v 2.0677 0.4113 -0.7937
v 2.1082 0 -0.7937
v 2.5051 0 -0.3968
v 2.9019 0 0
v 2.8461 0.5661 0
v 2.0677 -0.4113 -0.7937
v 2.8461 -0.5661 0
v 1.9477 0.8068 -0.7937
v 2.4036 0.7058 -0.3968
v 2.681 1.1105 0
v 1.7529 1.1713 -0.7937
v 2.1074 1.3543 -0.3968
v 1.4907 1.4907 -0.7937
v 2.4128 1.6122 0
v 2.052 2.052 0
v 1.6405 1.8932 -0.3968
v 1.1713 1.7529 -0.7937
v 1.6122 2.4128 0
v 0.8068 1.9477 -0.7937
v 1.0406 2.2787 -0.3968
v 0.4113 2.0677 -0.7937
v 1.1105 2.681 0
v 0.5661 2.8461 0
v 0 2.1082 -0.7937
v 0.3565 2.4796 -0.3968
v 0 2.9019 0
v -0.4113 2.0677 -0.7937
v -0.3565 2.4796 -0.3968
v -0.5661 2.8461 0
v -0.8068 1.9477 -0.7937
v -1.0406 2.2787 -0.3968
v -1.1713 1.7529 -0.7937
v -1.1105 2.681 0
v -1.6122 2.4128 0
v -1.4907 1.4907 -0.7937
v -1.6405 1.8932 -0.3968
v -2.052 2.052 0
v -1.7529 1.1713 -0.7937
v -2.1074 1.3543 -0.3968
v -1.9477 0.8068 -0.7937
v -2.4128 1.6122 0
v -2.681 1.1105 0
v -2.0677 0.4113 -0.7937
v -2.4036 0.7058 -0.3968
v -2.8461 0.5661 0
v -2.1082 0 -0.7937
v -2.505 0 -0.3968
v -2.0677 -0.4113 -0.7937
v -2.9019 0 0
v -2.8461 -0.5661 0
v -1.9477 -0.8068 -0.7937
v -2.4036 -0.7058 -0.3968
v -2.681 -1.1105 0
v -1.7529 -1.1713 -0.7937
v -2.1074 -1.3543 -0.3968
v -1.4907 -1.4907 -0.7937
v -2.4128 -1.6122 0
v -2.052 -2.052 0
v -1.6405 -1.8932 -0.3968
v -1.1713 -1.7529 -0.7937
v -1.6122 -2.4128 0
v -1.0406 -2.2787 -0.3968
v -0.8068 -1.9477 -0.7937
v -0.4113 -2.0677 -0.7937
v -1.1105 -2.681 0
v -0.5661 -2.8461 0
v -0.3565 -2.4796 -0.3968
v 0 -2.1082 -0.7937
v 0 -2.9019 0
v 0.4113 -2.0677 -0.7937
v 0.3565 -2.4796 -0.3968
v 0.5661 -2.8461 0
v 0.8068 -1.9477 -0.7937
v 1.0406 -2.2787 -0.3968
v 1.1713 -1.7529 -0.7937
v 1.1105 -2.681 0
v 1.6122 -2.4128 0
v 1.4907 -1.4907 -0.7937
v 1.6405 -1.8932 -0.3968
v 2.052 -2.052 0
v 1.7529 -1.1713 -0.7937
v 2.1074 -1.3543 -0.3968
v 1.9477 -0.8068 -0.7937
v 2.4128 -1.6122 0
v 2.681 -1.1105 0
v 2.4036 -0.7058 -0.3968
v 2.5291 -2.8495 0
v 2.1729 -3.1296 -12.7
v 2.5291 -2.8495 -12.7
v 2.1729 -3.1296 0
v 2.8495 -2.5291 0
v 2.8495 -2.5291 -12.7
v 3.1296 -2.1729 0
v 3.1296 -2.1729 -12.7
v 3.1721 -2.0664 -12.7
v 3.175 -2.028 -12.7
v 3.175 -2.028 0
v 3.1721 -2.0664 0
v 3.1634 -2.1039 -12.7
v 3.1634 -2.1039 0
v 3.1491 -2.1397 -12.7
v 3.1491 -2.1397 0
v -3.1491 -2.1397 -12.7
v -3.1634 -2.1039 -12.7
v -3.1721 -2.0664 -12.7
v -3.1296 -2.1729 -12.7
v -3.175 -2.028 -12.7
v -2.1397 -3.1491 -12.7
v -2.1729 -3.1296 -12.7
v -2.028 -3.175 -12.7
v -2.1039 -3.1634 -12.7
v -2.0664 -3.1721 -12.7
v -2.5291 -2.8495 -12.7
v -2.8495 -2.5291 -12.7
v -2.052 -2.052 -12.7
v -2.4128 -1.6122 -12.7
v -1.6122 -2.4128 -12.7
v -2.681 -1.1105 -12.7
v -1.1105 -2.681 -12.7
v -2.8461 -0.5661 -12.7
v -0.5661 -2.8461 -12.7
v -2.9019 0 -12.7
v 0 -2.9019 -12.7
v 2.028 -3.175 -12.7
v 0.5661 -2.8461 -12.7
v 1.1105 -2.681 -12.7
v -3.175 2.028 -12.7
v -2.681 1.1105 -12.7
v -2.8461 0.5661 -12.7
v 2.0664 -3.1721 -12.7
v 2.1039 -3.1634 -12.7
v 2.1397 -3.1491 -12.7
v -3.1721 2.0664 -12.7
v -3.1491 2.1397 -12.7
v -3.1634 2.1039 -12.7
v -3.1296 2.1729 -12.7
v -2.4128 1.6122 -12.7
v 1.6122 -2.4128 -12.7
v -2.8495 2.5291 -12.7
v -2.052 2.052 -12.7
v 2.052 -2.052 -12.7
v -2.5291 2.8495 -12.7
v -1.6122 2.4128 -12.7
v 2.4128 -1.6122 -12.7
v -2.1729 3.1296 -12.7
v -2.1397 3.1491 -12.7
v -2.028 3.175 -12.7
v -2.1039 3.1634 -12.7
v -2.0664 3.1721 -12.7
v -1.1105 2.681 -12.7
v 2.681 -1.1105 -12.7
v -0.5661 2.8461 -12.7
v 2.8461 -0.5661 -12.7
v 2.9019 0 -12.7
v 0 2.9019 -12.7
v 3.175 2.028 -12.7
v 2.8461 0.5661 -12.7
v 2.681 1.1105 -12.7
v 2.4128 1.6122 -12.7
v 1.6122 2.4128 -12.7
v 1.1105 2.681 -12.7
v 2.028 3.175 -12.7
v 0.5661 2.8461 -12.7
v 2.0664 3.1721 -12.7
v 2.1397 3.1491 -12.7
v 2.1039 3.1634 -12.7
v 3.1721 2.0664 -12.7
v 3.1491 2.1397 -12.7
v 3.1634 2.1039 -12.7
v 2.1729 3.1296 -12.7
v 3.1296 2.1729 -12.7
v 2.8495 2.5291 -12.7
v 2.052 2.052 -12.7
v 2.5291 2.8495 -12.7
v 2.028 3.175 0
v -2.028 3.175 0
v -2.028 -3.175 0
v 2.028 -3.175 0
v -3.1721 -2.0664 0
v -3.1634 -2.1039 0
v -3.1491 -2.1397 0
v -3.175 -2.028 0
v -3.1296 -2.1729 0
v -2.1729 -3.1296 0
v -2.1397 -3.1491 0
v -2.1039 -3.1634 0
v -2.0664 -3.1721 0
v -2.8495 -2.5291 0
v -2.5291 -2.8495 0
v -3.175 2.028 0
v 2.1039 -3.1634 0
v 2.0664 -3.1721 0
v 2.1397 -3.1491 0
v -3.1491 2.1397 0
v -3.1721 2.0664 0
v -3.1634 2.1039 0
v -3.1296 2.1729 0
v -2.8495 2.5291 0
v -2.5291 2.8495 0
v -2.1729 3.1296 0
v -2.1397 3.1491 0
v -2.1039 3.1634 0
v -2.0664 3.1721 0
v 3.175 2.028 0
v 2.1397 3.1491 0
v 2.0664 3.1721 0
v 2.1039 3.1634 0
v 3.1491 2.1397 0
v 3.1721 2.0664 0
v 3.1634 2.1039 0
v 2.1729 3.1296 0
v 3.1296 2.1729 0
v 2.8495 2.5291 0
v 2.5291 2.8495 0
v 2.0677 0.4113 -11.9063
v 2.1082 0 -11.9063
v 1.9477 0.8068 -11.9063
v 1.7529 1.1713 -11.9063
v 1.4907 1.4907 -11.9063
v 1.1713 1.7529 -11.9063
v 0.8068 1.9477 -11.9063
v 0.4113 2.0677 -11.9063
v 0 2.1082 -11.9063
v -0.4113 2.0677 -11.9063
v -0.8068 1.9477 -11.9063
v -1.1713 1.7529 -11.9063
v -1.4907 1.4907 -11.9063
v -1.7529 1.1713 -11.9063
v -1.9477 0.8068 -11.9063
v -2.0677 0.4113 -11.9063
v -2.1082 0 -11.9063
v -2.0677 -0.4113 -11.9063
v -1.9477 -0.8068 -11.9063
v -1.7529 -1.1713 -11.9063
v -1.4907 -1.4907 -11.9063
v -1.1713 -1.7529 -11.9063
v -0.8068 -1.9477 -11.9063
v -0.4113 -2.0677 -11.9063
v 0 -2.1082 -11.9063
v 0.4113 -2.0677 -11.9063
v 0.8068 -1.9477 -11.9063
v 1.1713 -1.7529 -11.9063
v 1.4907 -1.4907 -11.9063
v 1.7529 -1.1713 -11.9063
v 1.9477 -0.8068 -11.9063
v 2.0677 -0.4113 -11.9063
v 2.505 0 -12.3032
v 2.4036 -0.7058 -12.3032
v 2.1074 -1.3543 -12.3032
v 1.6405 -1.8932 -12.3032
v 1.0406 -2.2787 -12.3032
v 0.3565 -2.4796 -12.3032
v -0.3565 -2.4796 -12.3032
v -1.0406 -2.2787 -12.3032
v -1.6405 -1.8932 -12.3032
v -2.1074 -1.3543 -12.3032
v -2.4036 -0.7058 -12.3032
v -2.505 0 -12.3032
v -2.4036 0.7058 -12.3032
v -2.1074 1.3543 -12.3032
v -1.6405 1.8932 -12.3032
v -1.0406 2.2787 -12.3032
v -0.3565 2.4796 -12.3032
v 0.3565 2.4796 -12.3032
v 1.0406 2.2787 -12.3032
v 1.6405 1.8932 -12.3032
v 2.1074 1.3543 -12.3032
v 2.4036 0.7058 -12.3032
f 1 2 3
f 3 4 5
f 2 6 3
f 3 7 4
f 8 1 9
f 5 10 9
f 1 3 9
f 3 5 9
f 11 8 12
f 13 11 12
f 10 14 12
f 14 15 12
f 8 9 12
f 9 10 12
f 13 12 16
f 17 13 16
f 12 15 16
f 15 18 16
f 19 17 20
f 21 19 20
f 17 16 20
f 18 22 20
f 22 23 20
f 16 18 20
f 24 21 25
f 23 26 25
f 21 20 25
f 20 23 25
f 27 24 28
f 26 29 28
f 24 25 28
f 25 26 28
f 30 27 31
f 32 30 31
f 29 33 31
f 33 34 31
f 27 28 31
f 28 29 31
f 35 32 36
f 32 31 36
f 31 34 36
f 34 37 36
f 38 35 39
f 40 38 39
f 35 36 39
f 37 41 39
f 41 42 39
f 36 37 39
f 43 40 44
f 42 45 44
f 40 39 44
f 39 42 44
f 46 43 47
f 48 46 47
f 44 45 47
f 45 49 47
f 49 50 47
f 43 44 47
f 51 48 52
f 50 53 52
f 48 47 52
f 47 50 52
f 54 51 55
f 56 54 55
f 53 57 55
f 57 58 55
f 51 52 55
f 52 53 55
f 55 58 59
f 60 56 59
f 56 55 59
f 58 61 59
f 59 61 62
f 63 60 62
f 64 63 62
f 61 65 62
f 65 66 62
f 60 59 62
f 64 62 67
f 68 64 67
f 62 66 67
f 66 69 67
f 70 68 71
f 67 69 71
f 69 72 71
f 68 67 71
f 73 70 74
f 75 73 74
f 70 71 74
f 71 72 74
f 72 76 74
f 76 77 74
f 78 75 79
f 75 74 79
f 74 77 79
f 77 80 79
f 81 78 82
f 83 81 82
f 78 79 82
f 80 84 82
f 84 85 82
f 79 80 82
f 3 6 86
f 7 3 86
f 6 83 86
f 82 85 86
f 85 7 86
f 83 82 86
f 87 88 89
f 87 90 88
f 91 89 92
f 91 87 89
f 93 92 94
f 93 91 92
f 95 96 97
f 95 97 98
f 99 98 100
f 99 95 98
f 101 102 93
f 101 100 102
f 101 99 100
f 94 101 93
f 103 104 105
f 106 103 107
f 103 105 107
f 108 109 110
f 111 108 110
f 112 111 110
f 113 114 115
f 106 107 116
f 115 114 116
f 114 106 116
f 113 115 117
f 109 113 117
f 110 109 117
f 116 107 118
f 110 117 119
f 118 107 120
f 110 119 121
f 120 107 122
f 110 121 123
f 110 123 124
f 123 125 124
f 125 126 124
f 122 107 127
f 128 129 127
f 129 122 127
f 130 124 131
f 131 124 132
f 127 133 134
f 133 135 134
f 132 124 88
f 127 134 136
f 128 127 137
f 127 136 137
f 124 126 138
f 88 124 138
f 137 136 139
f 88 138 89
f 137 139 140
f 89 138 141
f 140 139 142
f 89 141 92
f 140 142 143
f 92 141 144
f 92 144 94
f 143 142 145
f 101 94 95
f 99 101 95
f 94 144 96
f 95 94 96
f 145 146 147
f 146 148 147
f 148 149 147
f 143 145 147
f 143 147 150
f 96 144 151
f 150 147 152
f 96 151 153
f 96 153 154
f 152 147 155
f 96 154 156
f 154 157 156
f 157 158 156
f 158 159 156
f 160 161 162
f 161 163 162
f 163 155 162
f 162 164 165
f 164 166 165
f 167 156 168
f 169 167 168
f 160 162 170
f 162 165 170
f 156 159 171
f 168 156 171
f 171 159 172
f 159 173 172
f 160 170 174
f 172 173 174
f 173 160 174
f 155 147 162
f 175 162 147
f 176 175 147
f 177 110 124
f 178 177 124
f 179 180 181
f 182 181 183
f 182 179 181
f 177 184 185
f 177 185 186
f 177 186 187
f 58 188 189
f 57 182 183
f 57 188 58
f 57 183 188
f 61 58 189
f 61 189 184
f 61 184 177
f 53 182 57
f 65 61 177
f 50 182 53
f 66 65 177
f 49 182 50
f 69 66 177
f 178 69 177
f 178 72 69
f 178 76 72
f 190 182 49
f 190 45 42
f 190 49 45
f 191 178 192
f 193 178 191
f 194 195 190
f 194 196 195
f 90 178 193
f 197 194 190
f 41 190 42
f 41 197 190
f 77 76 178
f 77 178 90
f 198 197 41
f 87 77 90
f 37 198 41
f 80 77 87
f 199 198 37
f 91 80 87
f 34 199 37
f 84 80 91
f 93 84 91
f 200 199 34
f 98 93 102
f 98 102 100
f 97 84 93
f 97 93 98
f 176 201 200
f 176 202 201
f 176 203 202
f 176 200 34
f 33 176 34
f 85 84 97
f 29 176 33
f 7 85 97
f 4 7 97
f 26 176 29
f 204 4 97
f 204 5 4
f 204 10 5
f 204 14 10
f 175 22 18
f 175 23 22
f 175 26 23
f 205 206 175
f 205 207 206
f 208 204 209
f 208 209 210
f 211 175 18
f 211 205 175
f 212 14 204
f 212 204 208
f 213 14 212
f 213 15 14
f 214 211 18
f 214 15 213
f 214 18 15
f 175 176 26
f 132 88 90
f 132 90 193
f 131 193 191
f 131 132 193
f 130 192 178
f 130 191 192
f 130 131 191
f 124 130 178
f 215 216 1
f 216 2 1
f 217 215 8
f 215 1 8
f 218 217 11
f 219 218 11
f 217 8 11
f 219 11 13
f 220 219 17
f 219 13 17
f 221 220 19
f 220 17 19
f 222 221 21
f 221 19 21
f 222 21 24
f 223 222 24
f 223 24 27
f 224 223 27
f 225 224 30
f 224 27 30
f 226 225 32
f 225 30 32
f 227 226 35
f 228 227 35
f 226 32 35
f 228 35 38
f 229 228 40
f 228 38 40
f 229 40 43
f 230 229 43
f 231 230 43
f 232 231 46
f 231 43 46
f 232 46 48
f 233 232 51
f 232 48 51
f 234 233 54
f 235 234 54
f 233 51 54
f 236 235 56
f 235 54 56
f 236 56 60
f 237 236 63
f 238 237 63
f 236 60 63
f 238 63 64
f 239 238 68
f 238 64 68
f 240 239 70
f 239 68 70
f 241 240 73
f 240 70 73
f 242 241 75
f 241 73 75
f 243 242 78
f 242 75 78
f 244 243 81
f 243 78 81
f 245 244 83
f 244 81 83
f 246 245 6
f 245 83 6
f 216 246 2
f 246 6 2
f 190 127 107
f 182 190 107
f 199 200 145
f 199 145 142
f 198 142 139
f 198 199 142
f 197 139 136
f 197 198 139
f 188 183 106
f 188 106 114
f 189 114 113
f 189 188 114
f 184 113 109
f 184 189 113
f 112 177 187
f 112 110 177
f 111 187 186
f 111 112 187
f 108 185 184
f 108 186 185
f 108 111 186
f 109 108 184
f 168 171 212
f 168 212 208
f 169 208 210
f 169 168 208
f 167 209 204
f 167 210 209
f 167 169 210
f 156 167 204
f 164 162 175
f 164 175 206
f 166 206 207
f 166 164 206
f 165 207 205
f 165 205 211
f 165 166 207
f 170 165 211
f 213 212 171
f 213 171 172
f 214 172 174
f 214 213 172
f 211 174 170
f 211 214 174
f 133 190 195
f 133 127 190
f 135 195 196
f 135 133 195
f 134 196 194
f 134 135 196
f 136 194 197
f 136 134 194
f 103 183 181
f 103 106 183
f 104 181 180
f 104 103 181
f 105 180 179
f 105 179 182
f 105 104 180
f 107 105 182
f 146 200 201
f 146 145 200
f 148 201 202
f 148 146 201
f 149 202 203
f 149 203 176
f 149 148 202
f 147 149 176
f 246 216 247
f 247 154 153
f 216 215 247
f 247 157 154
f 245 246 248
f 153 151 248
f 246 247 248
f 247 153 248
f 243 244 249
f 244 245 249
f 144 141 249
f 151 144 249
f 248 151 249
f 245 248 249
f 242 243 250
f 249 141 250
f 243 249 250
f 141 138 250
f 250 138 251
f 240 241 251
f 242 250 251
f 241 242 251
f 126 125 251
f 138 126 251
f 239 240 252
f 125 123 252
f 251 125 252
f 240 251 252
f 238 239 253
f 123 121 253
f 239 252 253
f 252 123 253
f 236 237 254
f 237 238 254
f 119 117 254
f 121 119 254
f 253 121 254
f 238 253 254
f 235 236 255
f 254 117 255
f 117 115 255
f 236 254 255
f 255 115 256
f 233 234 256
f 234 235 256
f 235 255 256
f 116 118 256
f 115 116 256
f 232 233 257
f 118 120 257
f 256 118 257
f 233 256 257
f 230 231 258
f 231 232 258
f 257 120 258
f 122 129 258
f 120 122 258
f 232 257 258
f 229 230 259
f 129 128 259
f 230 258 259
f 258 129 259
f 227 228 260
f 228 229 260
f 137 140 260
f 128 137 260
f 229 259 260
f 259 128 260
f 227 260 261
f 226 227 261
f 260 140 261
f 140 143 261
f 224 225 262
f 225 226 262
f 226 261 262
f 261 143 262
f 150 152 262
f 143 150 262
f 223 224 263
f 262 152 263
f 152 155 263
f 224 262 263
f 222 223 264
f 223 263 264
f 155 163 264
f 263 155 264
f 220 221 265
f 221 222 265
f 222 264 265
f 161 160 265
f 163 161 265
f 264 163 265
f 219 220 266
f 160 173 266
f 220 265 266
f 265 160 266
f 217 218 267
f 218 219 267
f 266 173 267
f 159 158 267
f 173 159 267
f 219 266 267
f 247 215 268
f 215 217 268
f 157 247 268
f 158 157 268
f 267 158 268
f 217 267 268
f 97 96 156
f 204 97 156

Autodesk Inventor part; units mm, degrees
ref_plane "YZ Plane" through (0, 0, 0) normal (1, 0, 0) x (0, 1, 0)
ref_plane "XZ Plane" through (0, 0, 0) normal (0, 1, 0) x (-1, 0, 0)
ref_plane "XY Plane" through (0, 0, 0) normal (0, 0, 1) x (1, 0, 0)
sketch "Sketch1" plane through (0, 0, 0) normal (0, 0, 1) x (1, 0, 0)
  line L0 (-3.175, -3.175) -> (3.175, -3.175)
  line L1 (3.175, -3.175) -> (3.175, 3.175)
  line L2 (3.175, 3.175) -> (-3.175, 3.175)
  line L3 (-3.175, 3.175) -> (-3.175, -3.175)
  line L4 (-3.175, -3.175) -> (3.175, 3.175) construction
  line L5 (3.175, -3.175) -> (-3.175, 3.175) construction
  circle A0 centre (0, 0) radius 3.81
  point P0 (2.1061, -3.175)
  point P1 (3.175, -2.1061)
  point P2 (3.175, 2.1061)
  point P3 (2.1061, 3.175)
  point P4 (-2.1061, 3.175)
  point P5 (-3.175, 2.1061)
  point P6 (-3.175, -2.1061)
  point P7 (-2.1061, -3.175)
  dimension "d0" = 7.62
  dimension "d1" = 6.35
extrude "Extrusion1" add sketch "Sketch1" against normal blind 12.7 contours A0 L3 L2 L1 L0
sketch "Sketch2" plane through (0, 0, 0) normal (0, 0, 1) x (1, 0, 0)
  arc A0 (2.1061, -3.175) -> (3.175, -2.1061) centre (0, 0) ccw construction
  circle A1 centre (0, 0) radius 2.1082
  dimension "d4" = 4.2164
extrude "Extrusion2" cut sketch "Sketch2" against normal blind 12.7
fillet "Fillet1" radius 0.254 8 edges at (2.1061, 3.175, -6.35) (3.175, 2.1061, -6.35) (3.175, -2.1061, -6.35) (2.1061, -3.175, -6.35) (-2.1061, -3.175, -6.35) (-3.175, -2.1061, -6.35) (-3.175, 2.1061, -6.35) (-2.1061, 3.175, -6.35)
chamfer "Chamfer1" distance 0.7937 angle 45 2 edges at (-2.1082, 0, 0) (-2.1082, 0, -12.7)
properties part number "HS Shaft Adapter Circle"
